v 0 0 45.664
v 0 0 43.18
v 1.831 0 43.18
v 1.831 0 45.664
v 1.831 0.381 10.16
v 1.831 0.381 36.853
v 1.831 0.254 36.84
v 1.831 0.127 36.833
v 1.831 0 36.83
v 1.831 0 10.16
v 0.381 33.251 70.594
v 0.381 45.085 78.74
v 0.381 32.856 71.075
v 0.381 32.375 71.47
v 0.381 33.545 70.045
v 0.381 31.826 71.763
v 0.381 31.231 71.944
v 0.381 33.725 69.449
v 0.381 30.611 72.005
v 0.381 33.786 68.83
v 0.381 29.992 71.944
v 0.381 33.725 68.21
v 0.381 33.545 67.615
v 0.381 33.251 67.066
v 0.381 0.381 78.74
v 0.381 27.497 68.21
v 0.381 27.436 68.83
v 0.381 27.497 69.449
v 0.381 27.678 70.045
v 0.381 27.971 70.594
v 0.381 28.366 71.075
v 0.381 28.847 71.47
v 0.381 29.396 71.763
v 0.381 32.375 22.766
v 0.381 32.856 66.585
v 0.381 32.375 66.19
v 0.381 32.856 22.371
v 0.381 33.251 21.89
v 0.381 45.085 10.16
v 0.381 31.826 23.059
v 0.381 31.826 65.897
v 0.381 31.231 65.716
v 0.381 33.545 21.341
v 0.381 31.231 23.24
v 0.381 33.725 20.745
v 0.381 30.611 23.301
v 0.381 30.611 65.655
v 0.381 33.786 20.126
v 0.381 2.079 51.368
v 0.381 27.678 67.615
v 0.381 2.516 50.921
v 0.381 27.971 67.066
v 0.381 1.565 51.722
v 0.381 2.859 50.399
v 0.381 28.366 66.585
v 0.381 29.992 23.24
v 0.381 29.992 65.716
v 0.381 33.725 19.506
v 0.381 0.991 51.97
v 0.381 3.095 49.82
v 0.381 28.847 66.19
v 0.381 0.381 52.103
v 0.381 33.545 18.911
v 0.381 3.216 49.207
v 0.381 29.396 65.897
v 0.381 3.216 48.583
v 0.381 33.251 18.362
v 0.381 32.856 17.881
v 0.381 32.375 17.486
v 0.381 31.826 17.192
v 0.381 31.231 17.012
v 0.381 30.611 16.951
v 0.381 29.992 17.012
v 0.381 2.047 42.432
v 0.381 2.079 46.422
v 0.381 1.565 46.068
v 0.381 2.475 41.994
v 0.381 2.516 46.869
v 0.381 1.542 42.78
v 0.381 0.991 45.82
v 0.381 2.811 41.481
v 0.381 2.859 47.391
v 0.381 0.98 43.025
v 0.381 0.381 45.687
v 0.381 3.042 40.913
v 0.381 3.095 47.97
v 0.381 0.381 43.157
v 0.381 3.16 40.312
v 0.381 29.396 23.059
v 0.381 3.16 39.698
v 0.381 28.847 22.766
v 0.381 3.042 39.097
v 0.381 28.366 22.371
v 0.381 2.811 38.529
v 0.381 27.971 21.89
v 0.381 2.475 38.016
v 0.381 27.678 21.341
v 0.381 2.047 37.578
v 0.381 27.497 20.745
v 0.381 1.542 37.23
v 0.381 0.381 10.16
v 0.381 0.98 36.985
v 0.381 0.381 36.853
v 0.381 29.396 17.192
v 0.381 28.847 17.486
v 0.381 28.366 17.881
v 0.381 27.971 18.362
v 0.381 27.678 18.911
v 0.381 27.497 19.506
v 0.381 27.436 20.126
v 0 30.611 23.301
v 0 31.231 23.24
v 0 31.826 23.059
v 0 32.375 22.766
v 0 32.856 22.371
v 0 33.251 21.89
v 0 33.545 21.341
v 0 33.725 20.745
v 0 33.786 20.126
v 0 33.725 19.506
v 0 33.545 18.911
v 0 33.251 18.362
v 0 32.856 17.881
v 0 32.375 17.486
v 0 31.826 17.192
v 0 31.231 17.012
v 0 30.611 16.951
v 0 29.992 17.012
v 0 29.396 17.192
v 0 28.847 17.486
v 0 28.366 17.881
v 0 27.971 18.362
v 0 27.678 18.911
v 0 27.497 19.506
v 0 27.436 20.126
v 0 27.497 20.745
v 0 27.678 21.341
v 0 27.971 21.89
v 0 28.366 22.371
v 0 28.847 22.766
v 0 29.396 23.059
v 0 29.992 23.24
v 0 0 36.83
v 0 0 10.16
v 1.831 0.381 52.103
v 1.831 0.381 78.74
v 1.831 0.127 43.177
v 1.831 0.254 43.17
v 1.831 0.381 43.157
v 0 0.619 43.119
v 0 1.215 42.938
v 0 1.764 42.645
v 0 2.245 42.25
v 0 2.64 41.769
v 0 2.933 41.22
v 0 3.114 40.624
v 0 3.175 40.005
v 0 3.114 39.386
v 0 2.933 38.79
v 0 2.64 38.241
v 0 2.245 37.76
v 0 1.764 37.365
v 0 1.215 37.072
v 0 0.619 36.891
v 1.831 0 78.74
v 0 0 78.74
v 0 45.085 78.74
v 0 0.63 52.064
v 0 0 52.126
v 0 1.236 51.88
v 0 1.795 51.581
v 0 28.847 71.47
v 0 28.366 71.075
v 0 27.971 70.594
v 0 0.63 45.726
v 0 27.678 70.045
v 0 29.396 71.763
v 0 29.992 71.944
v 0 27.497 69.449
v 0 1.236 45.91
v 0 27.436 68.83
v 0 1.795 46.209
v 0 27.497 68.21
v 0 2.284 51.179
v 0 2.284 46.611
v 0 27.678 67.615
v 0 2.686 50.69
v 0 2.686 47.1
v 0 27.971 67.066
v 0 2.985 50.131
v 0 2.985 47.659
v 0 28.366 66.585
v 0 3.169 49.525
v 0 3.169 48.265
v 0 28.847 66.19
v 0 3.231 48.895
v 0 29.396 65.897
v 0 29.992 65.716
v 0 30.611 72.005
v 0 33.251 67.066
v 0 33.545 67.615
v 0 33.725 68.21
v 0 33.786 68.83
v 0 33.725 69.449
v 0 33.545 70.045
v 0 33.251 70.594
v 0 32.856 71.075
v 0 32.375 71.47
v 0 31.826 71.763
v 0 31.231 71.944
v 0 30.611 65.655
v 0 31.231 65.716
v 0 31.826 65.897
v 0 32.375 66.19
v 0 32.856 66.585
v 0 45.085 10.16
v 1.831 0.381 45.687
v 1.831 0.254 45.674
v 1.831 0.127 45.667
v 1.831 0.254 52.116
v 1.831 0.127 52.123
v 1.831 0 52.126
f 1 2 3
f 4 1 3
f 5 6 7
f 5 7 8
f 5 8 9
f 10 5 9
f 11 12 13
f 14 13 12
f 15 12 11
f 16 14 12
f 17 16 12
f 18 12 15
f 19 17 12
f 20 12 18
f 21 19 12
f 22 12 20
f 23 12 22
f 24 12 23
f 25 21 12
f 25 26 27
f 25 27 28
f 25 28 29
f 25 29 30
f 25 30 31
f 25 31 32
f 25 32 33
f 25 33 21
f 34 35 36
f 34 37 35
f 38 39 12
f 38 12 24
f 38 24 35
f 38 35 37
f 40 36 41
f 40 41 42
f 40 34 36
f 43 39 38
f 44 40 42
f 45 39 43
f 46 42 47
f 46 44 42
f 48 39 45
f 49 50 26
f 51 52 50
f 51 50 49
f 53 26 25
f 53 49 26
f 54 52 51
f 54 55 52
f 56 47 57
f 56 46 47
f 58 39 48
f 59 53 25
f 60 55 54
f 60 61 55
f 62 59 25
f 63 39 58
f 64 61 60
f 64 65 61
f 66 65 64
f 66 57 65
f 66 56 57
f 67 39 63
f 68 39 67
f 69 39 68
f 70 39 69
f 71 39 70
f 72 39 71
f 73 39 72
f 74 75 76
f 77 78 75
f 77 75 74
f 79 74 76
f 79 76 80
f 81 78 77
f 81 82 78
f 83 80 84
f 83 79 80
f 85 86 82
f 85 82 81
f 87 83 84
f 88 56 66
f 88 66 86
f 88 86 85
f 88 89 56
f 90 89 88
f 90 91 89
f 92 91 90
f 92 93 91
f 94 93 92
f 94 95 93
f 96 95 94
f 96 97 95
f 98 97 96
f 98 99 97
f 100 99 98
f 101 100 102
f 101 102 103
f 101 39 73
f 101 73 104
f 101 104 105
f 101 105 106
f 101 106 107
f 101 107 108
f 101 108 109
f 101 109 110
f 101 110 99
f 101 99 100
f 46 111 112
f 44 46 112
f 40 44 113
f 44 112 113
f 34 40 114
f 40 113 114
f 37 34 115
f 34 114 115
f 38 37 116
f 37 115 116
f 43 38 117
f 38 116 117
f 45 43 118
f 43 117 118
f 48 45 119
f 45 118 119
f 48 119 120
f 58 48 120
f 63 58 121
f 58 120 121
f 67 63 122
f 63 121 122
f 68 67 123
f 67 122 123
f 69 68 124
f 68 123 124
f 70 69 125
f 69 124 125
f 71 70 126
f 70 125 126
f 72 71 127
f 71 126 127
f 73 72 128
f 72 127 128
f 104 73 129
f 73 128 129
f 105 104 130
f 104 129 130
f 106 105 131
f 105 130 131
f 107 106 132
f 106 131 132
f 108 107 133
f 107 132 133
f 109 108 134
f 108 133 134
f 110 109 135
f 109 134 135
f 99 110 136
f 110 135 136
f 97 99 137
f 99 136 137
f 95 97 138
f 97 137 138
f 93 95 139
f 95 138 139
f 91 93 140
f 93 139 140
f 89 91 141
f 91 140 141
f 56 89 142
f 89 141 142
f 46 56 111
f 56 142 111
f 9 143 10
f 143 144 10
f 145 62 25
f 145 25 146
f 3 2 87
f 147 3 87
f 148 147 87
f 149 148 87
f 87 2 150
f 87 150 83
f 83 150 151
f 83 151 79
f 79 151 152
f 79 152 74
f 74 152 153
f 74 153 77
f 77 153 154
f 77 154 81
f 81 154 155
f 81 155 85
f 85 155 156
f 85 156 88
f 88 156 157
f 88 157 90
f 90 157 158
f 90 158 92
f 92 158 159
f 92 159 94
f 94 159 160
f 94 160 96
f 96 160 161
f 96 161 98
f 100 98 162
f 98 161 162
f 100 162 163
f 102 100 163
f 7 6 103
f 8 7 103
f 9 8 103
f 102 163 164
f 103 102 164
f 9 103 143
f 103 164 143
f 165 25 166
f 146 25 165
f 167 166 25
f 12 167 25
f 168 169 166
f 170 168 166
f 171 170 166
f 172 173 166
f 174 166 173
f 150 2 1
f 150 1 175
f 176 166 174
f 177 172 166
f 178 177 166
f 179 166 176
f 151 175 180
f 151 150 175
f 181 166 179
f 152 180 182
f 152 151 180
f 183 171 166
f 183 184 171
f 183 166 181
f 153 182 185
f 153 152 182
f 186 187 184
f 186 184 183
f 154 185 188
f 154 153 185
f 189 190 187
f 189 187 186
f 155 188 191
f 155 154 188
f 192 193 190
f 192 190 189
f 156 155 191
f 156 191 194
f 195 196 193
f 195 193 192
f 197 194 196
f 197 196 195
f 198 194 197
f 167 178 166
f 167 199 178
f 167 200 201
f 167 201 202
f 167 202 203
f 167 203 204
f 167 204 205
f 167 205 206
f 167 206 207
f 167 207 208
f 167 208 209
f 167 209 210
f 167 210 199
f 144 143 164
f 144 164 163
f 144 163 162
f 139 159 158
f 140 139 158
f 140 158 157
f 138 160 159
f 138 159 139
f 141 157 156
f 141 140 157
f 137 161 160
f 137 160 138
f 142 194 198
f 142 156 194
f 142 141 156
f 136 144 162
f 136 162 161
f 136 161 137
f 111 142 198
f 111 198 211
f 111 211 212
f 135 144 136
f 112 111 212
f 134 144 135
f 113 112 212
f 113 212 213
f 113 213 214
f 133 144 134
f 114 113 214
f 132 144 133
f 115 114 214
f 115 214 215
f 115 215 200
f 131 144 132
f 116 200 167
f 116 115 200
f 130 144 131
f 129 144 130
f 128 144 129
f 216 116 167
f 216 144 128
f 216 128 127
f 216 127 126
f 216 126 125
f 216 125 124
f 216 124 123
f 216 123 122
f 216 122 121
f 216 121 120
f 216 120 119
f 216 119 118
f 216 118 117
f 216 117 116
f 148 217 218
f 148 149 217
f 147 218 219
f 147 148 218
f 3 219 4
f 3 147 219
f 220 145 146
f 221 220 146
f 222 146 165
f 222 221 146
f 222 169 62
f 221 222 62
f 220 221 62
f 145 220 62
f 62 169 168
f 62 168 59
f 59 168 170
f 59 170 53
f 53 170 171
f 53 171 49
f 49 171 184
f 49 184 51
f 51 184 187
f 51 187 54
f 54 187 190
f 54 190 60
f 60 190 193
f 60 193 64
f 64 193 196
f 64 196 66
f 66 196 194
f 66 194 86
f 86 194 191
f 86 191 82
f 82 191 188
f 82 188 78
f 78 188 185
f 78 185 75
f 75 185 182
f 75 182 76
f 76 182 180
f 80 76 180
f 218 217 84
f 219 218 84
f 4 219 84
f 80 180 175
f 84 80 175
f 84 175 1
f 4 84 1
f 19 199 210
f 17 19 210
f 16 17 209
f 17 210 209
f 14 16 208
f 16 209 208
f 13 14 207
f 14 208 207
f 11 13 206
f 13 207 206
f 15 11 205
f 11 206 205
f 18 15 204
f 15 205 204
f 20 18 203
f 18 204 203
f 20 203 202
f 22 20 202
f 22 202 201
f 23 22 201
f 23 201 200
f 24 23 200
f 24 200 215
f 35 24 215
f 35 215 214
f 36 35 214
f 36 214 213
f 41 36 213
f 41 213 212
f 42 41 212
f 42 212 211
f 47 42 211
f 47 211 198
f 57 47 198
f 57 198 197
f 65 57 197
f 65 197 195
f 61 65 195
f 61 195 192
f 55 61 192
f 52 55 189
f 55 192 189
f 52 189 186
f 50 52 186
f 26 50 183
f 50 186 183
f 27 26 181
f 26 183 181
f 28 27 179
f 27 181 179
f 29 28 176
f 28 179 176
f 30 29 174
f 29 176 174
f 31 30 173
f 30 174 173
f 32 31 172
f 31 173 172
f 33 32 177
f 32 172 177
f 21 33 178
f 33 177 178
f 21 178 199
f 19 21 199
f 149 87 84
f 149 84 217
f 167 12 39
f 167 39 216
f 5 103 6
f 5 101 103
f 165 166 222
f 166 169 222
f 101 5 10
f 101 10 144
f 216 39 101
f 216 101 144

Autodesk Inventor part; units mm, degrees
ref_plane "YZ Plane" through (0, 0, 0) normal (1, 0, 0) x (0, 1, 0)
ref_plane "XZ Plane" through (0, 0, 0) normal (0, 1, 0) x (-1, 0, 0)
ref_plane "XY Plane" through (0, 0, 0) normal (0, 0, 1) x (1, 0, 0)
sketch "Sketch1" plane through (0, 0, 0) normal (0, 0, 1) x (1, 0, 0)
  line L0 (0, 0) -> (1.8311, 0)
  line L1 (0, 0) -> (0, 45.085)
  line L2 (0.381, 45.085) -> (0.381, 0.381)
  line L3 (0.381, 0.381) -> (1.8311, 0.381)
  line L4 (1.8311, 0.381) -> (1.8311, 0)
  line L5 (0.381, 45.085) -> (0, 45.085)
  dimension "d0" = 1.8311
  dimension "d1" = 45.085
  dimension "d2" = 0.381
extrude "Extrusion1" add sketch "Sketch1" along normal blind 88.9
fillet "Fillet1" radius 2.54 2 edges at (0.1905, 45.085, 88.9) (0.1905, 45.085, 0)
sketch "Sketch2" plane through (0, 0, 0) normal (-1, 0, 0) x (0, 0, 1)
  line L0 (0, 0) -> (88.9, 0) projected
  circle A0 centre (40.005, 0) radius 3.175
  circle A1 centre (48.895, 0) radius 3.2307
  dimension "d6" = 6.35
  dimension "d7" = 8.89
  dimension "d8" = 40.005
extrude "Extrusion2" cut sketch "Sketch2" against normal blind 88.9
sketch "Sketch3" plane through (0, 0, 0) normal (-1, 0, 0) x (0, 0, 1)
  circle A0 centre (20.1258, 30.6113) radius 3.175
  circle A1 centre (68.8299, 30.6113) radius 3.175
  line L0 (88.9, 42.545) -> (88.9, 0) projected
  line L1 (0, 42.545) -> (0, 0) projected
  line L2 (2.54, 45.085) -> (86.36, 45.085) projected
  line L3 (68.8299, 30.6113) -> (48.9507, 0)
  line L4 (48.9507, 0) -> (88.9, 0)
  line L5 (20.1258, 30.6113) -> (40.005, 0)
  line L6 (0, 0.381) -> (36.8529, 0.381) projected
  line L7 (40.005, 0) -> (0, 0)
  point P0 (52.1257, 0)
  point P1 (36.83, 0)
  dimension "d11" = 6.35
  dimension "d12" = 6.35
  dimension "d19" = 3.175
  dimension "d20" = 3.175
  dimension "d21" = 36.4998
  dimension "d22" = 45.085
  dimension "d23" = 45.085
  dimension "d24" = 36.4998
  dimension "d25" = 57
  dimension "d26" = 57
extrude "Extrusion3" cut sketch "Sketch3" against normal blind 88.9
sketch "Sketch4" plane through (0, 0, 88.9) normal (0, 0, 1) x (1, 0, 0)
  line L0 (-18.865, 53.0436) -> (15.9708, 53.0436)
  line L1 (15.9708, 53.0436) -> (15.9708, -6.5967)
  line L2 (15.9708, -6.5967) -> (-18.865, -6.5967)
  line L3 (-18.865, -6.5967) -> (-18.865, 53.0436)
  point P0 (0, 0)
extrude "Extrusion4" cut sketch "Sketch4" against normal blind 10.16
sketch "Sketch5" plane through (0, 0, 0) normal (0, 0, -1) x (-1, 0, 0)
  line L0 (-43.1556, 80.8845) -> (23.5088, 80.8845)
  line L1 (23.5088, 80.8845) -> (23.5088, -34.0438)
  line L2 (23.5088, -34.0438) -> (-43.1556, -34.0438)
  line L3 (-43.1556, -34.0438) -> (-43.1556, 80.8845)
  point P0 (0, 0)
extrude "Extrusion5" cut sketch "Sketch5" against normal blind 10.16
properties part number "Fin_short" material "Aluminum 6061"
